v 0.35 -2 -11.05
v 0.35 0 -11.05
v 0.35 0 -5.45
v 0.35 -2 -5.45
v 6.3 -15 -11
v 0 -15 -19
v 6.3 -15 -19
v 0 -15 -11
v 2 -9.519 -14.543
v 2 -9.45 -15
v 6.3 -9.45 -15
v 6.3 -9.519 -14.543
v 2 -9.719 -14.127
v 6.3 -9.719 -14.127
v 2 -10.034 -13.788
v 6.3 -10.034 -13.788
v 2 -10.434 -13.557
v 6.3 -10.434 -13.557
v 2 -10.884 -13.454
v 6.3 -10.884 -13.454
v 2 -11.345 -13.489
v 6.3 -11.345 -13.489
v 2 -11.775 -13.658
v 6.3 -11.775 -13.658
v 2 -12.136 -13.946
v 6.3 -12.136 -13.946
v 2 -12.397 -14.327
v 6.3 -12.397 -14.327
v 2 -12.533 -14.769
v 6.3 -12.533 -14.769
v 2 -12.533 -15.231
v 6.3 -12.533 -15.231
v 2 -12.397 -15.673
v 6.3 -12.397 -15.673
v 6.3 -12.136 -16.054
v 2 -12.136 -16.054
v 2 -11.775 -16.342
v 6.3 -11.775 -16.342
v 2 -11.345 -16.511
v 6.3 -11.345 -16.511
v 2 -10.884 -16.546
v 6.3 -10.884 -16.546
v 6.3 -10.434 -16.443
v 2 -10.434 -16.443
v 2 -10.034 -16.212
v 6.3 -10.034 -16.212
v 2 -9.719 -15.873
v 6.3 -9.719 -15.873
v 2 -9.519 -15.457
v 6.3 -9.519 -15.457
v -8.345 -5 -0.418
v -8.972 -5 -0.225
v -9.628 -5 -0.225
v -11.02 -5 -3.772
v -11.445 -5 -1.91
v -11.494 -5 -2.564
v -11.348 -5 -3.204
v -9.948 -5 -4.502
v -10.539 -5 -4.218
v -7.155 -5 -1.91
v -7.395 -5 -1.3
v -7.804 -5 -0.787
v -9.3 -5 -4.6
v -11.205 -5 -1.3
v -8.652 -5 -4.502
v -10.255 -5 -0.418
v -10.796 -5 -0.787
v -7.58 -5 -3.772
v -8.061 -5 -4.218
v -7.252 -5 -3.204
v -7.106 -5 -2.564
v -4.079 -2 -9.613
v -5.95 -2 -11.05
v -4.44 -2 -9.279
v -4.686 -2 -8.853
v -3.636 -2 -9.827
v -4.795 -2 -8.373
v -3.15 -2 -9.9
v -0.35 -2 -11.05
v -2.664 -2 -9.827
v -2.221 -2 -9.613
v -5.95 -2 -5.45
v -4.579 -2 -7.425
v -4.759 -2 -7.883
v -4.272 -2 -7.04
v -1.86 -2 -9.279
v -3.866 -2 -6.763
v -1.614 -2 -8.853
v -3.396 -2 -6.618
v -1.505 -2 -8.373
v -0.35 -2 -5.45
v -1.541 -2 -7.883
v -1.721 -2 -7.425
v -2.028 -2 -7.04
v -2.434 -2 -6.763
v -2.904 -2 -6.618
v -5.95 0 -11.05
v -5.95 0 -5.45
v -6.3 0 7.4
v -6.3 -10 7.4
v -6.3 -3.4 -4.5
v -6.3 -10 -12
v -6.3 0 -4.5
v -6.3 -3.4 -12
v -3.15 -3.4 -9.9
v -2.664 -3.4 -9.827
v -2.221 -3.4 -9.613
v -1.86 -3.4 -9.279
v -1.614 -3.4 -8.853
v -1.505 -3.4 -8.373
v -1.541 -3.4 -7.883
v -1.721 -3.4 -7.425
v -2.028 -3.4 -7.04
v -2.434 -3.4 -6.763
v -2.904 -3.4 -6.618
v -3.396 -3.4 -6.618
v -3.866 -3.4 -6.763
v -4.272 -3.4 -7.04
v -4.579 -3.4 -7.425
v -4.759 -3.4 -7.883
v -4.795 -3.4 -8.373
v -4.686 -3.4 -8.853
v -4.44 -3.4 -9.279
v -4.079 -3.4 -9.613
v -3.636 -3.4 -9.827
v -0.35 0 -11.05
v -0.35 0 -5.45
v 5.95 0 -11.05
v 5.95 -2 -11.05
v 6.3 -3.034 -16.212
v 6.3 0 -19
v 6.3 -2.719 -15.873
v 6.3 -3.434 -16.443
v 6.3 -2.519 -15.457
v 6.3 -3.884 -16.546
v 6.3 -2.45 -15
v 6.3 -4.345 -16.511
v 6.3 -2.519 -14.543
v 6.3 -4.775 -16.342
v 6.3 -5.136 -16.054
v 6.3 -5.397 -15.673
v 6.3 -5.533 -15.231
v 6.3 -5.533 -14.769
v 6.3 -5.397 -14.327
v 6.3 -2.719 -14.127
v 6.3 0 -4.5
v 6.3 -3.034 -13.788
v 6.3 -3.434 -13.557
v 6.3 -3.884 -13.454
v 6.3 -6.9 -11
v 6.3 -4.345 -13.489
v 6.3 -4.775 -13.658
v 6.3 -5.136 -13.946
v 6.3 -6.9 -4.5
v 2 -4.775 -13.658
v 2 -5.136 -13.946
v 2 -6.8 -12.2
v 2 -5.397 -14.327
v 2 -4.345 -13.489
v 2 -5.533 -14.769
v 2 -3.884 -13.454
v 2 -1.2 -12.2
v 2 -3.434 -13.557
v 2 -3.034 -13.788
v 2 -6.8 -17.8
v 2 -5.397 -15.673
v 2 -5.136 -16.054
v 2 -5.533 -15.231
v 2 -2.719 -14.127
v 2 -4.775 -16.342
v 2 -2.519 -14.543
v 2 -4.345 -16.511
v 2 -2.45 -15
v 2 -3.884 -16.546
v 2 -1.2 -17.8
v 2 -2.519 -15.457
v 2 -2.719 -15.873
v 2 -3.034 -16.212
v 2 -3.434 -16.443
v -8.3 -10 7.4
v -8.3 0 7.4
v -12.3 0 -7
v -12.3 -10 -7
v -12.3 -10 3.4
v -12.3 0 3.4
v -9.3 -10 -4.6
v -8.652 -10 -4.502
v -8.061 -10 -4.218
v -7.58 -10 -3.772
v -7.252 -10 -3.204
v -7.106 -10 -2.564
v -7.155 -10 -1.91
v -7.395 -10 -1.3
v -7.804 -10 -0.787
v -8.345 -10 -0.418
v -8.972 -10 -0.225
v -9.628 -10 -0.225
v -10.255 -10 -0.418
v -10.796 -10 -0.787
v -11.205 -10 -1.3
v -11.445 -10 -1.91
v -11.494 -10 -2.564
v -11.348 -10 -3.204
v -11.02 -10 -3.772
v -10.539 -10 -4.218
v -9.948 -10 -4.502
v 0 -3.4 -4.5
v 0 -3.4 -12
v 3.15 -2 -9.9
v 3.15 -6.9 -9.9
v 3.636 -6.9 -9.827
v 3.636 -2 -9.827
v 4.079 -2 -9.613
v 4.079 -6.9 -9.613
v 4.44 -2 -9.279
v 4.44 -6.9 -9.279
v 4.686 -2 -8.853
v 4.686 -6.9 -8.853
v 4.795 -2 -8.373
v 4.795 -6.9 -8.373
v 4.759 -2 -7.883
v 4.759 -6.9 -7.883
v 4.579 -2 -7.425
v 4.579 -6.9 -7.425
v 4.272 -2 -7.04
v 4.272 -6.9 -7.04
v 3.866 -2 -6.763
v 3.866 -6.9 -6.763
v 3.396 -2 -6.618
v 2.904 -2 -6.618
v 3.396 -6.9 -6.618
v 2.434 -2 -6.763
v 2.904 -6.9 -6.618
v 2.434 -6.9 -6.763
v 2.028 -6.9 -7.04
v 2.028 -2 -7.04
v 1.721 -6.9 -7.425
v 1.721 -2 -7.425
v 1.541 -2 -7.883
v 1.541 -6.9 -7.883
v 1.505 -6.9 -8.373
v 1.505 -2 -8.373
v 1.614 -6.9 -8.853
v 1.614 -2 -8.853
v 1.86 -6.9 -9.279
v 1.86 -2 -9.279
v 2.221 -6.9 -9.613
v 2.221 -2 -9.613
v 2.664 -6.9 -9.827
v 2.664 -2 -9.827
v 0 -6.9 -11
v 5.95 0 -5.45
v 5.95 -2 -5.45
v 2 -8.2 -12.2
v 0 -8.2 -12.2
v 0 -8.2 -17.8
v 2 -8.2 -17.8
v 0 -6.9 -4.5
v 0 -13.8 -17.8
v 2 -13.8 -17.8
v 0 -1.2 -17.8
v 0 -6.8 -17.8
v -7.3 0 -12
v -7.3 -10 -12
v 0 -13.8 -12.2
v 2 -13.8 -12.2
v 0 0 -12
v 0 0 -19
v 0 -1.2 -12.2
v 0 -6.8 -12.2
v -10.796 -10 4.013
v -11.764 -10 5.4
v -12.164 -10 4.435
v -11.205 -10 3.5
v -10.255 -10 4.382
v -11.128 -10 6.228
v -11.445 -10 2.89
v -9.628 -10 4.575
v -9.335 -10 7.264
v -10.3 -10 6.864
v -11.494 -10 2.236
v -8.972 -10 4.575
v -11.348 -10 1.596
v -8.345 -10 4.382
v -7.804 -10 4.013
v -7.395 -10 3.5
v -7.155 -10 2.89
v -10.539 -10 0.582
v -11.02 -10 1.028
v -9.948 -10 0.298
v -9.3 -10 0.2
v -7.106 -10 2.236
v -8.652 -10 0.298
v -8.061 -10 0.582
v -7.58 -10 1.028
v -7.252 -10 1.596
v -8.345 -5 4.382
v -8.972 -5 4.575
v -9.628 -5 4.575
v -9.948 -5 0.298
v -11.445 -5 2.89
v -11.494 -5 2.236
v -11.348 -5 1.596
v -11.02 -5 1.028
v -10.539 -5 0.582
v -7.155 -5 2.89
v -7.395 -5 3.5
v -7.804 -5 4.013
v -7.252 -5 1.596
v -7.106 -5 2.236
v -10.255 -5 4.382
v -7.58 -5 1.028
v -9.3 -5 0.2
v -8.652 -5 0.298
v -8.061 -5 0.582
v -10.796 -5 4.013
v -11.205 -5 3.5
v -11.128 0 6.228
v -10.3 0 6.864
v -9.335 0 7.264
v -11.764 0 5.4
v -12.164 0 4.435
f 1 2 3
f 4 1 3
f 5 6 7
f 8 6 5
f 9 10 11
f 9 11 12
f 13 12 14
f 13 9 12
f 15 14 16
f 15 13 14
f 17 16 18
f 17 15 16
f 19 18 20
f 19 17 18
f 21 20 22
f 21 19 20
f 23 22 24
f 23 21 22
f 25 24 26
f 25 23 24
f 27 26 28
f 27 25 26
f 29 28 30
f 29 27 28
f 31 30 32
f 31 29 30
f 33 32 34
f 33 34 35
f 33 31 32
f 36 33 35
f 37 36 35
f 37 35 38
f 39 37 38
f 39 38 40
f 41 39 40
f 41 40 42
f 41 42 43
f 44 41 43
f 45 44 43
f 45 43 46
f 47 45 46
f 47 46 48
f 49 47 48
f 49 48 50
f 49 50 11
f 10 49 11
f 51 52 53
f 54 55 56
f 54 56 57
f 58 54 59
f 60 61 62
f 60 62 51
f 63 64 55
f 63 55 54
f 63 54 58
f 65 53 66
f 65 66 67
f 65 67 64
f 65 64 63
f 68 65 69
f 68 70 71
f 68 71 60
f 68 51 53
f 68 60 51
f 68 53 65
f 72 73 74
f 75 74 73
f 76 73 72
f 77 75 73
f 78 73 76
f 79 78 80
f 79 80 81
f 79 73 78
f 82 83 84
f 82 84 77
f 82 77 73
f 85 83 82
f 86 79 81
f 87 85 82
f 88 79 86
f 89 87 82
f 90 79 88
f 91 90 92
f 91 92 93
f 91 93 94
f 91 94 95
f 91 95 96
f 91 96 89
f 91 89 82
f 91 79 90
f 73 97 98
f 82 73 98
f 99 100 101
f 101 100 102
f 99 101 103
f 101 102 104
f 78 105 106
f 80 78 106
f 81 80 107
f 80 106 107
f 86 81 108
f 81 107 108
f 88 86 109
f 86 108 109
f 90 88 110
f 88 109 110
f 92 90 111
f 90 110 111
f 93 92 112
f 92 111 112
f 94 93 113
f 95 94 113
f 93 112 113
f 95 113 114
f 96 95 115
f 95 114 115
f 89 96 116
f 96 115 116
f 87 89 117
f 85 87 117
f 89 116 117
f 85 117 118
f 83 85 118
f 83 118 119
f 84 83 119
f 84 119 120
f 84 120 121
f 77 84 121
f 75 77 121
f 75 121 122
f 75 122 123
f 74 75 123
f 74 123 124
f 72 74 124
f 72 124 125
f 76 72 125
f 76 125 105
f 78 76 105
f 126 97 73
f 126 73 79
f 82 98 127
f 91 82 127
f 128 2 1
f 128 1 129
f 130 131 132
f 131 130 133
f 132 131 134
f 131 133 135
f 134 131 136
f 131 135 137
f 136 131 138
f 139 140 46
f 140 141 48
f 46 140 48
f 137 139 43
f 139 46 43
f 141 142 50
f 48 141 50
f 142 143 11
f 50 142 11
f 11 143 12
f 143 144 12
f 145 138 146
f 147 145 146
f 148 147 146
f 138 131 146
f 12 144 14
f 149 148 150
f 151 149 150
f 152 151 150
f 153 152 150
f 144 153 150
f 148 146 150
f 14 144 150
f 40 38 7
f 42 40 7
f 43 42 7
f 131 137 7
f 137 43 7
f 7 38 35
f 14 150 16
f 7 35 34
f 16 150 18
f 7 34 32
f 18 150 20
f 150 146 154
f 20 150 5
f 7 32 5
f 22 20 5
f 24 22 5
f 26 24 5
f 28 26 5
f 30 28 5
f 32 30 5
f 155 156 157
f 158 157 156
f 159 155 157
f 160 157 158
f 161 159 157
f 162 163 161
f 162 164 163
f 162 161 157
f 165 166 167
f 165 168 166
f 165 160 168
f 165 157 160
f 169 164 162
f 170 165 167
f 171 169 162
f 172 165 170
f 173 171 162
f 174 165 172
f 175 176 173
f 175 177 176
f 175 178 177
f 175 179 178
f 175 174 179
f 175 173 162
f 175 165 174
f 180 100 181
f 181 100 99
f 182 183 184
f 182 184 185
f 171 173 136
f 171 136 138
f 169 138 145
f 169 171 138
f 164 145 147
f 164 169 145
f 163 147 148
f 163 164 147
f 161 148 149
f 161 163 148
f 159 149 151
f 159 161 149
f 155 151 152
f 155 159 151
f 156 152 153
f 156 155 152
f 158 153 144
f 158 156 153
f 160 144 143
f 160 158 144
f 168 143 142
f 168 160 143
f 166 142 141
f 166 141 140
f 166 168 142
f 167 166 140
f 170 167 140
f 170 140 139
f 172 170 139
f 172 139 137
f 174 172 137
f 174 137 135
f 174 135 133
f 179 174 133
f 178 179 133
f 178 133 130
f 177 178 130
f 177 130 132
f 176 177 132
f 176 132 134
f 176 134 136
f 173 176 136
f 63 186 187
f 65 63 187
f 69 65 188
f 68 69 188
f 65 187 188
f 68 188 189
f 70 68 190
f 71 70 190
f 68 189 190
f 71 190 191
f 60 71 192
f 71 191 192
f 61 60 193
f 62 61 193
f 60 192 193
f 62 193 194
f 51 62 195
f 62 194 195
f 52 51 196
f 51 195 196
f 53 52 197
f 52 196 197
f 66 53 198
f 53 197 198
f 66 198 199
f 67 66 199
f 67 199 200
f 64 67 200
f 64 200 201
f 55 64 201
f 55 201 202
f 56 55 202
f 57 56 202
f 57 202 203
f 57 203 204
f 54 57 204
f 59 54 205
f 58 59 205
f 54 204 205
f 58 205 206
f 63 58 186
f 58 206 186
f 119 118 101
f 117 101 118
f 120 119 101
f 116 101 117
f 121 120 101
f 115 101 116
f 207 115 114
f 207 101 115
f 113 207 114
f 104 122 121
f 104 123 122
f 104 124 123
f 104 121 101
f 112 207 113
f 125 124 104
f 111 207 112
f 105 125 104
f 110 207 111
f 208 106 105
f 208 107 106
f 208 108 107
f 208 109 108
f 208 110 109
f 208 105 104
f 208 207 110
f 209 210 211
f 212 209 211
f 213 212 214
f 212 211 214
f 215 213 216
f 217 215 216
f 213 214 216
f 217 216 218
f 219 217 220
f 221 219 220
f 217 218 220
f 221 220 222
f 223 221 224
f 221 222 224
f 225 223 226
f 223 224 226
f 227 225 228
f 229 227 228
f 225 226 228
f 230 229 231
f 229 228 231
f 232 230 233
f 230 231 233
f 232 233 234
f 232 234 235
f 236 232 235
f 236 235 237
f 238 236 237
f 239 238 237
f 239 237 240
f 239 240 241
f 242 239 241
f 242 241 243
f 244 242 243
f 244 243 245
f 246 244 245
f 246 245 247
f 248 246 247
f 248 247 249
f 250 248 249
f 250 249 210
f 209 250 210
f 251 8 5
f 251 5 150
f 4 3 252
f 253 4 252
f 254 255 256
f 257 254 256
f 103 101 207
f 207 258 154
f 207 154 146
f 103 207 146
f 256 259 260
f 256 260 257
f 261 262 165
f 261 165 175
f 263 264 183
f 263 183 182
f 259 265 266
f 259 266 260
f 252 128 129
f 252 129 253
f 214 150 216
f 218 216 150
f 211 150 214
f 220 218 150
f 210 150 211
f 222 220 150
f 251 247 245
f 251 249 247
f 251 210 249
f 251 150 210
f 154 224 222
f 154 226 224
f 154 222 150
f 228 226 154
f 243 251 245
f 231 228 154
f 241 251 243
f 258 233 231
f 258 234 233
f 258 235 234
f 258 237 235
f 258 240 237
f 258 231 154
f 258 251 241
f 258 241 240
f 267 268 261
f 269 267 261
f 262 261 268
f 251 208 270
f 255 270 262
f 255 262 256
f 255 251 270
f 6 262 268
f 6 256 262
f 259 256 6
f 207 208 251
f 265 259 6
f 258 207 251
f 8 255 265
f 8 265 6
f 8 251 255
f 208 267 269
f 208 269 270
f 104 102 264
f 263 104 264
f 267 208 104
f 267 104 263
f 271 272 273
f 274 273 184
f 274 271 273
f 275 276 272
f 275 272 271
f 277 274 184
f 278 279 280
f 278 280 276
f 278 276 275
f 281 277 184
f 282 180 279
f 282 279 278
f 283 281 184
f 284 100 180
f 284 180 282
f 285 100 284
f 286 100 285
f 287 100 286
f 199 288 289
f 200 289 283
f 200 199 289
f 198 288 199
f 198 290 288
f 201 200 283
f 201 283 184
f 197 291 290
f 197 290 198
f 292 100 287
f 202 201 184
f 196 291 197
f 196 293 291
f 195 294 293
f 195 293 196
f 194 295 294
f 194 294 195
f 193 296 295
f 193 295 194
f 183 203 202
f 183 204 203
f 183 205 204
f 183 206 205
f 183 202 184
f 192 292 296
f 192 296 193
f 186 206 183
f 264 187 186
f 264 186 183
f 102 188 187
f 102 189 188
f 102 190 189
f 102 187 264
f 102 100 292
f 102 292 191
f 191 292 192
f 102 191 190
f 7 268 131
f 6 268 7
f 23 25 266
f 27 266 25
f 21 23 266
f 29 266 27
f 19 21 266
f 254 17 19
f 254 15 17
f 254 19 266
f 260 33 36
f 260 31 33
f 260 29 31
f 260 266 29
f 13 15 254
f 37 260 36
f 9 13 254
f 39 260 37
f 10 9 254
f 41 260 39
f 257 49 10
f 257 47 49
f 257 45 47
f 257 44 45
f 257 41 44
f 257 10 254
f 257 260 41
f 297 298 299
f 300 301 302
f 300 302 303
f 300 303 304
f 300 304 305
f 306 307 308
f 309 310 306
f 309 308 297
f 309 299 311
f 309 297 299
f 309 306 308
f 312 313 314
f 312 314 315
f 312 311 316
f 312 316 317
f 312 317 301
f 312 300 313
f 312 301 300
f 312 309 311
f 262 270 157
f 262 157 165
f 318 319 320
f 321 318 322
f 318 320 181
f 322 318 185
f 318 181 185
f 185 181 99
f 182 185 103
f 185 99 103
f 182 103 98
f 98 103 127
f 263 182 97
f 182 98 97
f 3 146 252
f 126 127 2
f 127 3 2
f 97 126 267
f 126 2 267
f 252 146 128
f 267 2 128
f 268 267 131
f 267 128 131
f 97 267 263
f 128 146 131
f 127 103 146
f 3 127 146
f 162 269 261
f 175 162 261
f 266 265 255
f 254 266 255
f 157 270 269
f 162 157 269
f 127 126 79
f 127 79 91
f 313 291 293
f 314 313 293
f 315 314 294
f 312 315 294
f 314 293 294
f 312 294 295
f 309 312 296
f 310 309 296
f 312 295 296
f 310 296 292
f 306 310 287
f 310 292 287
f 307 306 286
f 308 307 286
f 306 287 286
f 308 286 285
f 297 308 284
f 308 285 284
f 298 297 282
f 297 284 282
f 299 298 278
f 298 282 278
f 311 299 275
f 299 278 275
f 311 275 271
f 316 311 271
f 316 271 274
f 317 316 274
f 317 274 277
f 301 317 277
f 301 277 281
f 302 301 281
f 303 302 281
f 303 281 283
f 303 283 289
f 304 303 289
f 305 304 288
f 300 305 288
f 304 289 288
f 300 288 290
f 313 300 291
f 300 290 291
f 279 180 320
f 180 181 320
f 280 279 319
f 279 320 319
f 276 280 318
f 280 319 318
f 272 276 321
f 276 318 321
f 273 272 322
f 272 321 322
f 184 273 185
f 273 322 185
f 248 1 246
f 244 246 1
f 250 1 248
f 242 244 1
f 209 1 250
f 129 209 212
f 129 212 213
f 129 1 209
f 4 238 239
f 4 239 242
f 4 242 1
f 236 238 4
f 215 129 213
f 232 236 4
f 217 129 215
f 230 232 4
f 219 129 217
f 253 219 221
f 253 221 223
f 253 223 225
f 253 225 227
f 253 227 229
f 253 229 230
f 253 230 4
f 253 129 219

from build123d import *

# Parameters (mm, degrees)
SKETCH_R        = 1.55
PAD_DEPTH       = 6.3
SKETCH001_W     = 3.4
SKETCH001_H     = 7.5
PAD001_DEPTH    = 6.3
SKETCH002_W     = 10
SKETCH002_H     = 19.4
PAD002_DEPTH    = 6
SKETCH003_R     = 1.65
POCKET_DEPTH    = 6.901
SKETCH004_R     = 1.65
POCKET001_DEPTH = 3.401
SKETCH005_R     = 2.2
POCKET002_DEPTH = 5
SKETCH006_W     = 5.6
SKETCH006_H     = 5.6
POCKET003_DEPTH = 2
SKETCH007_W     = 5.6
SKETCH007_H     = 5.6
POCKET004_DEPTH = 2
FILLET_R        = 4
CHAMFER_SIZE    = 5


with BuildPart() as part:
    # Sketch → Pad (new body)
    with BuildSketch(Plane.YZ):
        Polygon((-6.9, -4.5), (0, -4.5), (0, -19), (-15, -19), (-15, -11), (-6.9, -11), align=None)
        with Locations((-11, -15)):
            Circle(SKETCH_R, mode=Mode.SUBTRACT)
        with Locations((-4, -15)):
            Circle(SKETCH_R, mode=Mode.SUBTRACT)
    extrude(amount=PAD_DEPTH)

    # Sketch001 (on Face9 of Pad) → Pad001 (join)
    with BuildSketch(Plane(origin=(0, 0, 0), x_dir=(0, 1, 0), z_dir=(-1, 0, 0))):
        with Locations((-1.7, 8.25)):
            Rectangle(SKETCH001_W, SKETCH001_H)
    extrude(amount=PAD001_DEPTH)

    # Sketch002 (on Face11 of Pad001) → Pad002 (join)
    with BuildSketch(Plane(origin=(-6.3, 0, 0), x_dir=(0, 1, 0), z_dir=(-1, 0, 0))):
        with Locations((-5, 2.3)):
            Rectangle(SKETCH002_W, SKETCH002_H)
    extrude(amount=PAD002_DEPTH)

    # Sketch003 (on Face1 of Pad002) → Pocket (cut, through all)
    with BuildSketch(Plane(origin=(0, -6.9, 0), x_dir=(0, 0, -1), z_dir=(0, -1, 0))):
        with Locations((8.25, 3.15)):
            Circle(SKETCH003_R)
    extrude(amount=-POCKET_DEPTH, mode=Mode.SUBTRACT)

    # Sketch004 (on Face11 of Pocket) → Pocket001 (cut, through all)
    with BuildSketch(Plane(origin=(0, -3.4, 0), x_dir=(0, 0, -1), z_dir=(0, -1, 0))):
        with Locations((8.25, -3.15)):
            Circle(SKETCH004_R)
    extrude(amount=-POCKET001_DEPTH, mode=Mode.SUBTRACT)

    # Sketch005 (on Face18 of Pocket001) → Pocket002 (cut)
    with BuildSketch(Plane(origin=(0, -10, 0), x_dir=(0, 0, -1), z_dir=(0, -1, 0))):
        with Locations((-2.4, -9.3)):
            Circle(SKETCH005_R)
        with Locations((2.4, -9.3)):
            Circle(SKETCH005_R)
    extrude(amount=-POCKET002_DEPTH, mode=Mode.SUBTRACT)

    # Sketch006 (on Face3 of Pocket002) → Pocket003 (cut)
    with BuildSketch(Plane(origin=(0, 0, 0), x_dir=(0, 1, 0), z_dir=(-1, 0, 0))):
        with Locations((-4, 15)):
            Rectangle(SKETCH006_W, SKETCH006_H)
        with Locations((-11, 15)):
            Rectangle(SKETCH006_W, SKETCH006_H)
    extrude(amount=-POCKET003_DEPTH, mode=Mode.SUBTRACT)

    # Sketch007 (on Face11 of Pocket003) → Pocket004 (cut)
    with BuildSketch(Plane.ZX):
        with Locations((-8.25, 3.15)):
            Rectangle(SKETCH007_W, SKETCH007_H)
        with Locations((-8.25, -3.15)):
            Rectangle(SKETCH007_W, SKETCH007_H)
    extrude(amount=-POCKET004_DEPTH, mode=Mode.SUBTRACT)

    # Fillet
    fillet_edges = [part.edges().sort_by_distance(p)[0] for p in [
        (-12.3, -5, 7.4),
    ]]
    fillet(fillet_edges, radius=FILLET_R)

    # Chamfer
    chamfer_edges = [part.edges().sort_by_distance(p)[0] for p in [
        (-12.3, -5, -12),
    ]]
    chamfer(chamfer_edges, length=CHAMFER_SIZE)


solid = part.part
